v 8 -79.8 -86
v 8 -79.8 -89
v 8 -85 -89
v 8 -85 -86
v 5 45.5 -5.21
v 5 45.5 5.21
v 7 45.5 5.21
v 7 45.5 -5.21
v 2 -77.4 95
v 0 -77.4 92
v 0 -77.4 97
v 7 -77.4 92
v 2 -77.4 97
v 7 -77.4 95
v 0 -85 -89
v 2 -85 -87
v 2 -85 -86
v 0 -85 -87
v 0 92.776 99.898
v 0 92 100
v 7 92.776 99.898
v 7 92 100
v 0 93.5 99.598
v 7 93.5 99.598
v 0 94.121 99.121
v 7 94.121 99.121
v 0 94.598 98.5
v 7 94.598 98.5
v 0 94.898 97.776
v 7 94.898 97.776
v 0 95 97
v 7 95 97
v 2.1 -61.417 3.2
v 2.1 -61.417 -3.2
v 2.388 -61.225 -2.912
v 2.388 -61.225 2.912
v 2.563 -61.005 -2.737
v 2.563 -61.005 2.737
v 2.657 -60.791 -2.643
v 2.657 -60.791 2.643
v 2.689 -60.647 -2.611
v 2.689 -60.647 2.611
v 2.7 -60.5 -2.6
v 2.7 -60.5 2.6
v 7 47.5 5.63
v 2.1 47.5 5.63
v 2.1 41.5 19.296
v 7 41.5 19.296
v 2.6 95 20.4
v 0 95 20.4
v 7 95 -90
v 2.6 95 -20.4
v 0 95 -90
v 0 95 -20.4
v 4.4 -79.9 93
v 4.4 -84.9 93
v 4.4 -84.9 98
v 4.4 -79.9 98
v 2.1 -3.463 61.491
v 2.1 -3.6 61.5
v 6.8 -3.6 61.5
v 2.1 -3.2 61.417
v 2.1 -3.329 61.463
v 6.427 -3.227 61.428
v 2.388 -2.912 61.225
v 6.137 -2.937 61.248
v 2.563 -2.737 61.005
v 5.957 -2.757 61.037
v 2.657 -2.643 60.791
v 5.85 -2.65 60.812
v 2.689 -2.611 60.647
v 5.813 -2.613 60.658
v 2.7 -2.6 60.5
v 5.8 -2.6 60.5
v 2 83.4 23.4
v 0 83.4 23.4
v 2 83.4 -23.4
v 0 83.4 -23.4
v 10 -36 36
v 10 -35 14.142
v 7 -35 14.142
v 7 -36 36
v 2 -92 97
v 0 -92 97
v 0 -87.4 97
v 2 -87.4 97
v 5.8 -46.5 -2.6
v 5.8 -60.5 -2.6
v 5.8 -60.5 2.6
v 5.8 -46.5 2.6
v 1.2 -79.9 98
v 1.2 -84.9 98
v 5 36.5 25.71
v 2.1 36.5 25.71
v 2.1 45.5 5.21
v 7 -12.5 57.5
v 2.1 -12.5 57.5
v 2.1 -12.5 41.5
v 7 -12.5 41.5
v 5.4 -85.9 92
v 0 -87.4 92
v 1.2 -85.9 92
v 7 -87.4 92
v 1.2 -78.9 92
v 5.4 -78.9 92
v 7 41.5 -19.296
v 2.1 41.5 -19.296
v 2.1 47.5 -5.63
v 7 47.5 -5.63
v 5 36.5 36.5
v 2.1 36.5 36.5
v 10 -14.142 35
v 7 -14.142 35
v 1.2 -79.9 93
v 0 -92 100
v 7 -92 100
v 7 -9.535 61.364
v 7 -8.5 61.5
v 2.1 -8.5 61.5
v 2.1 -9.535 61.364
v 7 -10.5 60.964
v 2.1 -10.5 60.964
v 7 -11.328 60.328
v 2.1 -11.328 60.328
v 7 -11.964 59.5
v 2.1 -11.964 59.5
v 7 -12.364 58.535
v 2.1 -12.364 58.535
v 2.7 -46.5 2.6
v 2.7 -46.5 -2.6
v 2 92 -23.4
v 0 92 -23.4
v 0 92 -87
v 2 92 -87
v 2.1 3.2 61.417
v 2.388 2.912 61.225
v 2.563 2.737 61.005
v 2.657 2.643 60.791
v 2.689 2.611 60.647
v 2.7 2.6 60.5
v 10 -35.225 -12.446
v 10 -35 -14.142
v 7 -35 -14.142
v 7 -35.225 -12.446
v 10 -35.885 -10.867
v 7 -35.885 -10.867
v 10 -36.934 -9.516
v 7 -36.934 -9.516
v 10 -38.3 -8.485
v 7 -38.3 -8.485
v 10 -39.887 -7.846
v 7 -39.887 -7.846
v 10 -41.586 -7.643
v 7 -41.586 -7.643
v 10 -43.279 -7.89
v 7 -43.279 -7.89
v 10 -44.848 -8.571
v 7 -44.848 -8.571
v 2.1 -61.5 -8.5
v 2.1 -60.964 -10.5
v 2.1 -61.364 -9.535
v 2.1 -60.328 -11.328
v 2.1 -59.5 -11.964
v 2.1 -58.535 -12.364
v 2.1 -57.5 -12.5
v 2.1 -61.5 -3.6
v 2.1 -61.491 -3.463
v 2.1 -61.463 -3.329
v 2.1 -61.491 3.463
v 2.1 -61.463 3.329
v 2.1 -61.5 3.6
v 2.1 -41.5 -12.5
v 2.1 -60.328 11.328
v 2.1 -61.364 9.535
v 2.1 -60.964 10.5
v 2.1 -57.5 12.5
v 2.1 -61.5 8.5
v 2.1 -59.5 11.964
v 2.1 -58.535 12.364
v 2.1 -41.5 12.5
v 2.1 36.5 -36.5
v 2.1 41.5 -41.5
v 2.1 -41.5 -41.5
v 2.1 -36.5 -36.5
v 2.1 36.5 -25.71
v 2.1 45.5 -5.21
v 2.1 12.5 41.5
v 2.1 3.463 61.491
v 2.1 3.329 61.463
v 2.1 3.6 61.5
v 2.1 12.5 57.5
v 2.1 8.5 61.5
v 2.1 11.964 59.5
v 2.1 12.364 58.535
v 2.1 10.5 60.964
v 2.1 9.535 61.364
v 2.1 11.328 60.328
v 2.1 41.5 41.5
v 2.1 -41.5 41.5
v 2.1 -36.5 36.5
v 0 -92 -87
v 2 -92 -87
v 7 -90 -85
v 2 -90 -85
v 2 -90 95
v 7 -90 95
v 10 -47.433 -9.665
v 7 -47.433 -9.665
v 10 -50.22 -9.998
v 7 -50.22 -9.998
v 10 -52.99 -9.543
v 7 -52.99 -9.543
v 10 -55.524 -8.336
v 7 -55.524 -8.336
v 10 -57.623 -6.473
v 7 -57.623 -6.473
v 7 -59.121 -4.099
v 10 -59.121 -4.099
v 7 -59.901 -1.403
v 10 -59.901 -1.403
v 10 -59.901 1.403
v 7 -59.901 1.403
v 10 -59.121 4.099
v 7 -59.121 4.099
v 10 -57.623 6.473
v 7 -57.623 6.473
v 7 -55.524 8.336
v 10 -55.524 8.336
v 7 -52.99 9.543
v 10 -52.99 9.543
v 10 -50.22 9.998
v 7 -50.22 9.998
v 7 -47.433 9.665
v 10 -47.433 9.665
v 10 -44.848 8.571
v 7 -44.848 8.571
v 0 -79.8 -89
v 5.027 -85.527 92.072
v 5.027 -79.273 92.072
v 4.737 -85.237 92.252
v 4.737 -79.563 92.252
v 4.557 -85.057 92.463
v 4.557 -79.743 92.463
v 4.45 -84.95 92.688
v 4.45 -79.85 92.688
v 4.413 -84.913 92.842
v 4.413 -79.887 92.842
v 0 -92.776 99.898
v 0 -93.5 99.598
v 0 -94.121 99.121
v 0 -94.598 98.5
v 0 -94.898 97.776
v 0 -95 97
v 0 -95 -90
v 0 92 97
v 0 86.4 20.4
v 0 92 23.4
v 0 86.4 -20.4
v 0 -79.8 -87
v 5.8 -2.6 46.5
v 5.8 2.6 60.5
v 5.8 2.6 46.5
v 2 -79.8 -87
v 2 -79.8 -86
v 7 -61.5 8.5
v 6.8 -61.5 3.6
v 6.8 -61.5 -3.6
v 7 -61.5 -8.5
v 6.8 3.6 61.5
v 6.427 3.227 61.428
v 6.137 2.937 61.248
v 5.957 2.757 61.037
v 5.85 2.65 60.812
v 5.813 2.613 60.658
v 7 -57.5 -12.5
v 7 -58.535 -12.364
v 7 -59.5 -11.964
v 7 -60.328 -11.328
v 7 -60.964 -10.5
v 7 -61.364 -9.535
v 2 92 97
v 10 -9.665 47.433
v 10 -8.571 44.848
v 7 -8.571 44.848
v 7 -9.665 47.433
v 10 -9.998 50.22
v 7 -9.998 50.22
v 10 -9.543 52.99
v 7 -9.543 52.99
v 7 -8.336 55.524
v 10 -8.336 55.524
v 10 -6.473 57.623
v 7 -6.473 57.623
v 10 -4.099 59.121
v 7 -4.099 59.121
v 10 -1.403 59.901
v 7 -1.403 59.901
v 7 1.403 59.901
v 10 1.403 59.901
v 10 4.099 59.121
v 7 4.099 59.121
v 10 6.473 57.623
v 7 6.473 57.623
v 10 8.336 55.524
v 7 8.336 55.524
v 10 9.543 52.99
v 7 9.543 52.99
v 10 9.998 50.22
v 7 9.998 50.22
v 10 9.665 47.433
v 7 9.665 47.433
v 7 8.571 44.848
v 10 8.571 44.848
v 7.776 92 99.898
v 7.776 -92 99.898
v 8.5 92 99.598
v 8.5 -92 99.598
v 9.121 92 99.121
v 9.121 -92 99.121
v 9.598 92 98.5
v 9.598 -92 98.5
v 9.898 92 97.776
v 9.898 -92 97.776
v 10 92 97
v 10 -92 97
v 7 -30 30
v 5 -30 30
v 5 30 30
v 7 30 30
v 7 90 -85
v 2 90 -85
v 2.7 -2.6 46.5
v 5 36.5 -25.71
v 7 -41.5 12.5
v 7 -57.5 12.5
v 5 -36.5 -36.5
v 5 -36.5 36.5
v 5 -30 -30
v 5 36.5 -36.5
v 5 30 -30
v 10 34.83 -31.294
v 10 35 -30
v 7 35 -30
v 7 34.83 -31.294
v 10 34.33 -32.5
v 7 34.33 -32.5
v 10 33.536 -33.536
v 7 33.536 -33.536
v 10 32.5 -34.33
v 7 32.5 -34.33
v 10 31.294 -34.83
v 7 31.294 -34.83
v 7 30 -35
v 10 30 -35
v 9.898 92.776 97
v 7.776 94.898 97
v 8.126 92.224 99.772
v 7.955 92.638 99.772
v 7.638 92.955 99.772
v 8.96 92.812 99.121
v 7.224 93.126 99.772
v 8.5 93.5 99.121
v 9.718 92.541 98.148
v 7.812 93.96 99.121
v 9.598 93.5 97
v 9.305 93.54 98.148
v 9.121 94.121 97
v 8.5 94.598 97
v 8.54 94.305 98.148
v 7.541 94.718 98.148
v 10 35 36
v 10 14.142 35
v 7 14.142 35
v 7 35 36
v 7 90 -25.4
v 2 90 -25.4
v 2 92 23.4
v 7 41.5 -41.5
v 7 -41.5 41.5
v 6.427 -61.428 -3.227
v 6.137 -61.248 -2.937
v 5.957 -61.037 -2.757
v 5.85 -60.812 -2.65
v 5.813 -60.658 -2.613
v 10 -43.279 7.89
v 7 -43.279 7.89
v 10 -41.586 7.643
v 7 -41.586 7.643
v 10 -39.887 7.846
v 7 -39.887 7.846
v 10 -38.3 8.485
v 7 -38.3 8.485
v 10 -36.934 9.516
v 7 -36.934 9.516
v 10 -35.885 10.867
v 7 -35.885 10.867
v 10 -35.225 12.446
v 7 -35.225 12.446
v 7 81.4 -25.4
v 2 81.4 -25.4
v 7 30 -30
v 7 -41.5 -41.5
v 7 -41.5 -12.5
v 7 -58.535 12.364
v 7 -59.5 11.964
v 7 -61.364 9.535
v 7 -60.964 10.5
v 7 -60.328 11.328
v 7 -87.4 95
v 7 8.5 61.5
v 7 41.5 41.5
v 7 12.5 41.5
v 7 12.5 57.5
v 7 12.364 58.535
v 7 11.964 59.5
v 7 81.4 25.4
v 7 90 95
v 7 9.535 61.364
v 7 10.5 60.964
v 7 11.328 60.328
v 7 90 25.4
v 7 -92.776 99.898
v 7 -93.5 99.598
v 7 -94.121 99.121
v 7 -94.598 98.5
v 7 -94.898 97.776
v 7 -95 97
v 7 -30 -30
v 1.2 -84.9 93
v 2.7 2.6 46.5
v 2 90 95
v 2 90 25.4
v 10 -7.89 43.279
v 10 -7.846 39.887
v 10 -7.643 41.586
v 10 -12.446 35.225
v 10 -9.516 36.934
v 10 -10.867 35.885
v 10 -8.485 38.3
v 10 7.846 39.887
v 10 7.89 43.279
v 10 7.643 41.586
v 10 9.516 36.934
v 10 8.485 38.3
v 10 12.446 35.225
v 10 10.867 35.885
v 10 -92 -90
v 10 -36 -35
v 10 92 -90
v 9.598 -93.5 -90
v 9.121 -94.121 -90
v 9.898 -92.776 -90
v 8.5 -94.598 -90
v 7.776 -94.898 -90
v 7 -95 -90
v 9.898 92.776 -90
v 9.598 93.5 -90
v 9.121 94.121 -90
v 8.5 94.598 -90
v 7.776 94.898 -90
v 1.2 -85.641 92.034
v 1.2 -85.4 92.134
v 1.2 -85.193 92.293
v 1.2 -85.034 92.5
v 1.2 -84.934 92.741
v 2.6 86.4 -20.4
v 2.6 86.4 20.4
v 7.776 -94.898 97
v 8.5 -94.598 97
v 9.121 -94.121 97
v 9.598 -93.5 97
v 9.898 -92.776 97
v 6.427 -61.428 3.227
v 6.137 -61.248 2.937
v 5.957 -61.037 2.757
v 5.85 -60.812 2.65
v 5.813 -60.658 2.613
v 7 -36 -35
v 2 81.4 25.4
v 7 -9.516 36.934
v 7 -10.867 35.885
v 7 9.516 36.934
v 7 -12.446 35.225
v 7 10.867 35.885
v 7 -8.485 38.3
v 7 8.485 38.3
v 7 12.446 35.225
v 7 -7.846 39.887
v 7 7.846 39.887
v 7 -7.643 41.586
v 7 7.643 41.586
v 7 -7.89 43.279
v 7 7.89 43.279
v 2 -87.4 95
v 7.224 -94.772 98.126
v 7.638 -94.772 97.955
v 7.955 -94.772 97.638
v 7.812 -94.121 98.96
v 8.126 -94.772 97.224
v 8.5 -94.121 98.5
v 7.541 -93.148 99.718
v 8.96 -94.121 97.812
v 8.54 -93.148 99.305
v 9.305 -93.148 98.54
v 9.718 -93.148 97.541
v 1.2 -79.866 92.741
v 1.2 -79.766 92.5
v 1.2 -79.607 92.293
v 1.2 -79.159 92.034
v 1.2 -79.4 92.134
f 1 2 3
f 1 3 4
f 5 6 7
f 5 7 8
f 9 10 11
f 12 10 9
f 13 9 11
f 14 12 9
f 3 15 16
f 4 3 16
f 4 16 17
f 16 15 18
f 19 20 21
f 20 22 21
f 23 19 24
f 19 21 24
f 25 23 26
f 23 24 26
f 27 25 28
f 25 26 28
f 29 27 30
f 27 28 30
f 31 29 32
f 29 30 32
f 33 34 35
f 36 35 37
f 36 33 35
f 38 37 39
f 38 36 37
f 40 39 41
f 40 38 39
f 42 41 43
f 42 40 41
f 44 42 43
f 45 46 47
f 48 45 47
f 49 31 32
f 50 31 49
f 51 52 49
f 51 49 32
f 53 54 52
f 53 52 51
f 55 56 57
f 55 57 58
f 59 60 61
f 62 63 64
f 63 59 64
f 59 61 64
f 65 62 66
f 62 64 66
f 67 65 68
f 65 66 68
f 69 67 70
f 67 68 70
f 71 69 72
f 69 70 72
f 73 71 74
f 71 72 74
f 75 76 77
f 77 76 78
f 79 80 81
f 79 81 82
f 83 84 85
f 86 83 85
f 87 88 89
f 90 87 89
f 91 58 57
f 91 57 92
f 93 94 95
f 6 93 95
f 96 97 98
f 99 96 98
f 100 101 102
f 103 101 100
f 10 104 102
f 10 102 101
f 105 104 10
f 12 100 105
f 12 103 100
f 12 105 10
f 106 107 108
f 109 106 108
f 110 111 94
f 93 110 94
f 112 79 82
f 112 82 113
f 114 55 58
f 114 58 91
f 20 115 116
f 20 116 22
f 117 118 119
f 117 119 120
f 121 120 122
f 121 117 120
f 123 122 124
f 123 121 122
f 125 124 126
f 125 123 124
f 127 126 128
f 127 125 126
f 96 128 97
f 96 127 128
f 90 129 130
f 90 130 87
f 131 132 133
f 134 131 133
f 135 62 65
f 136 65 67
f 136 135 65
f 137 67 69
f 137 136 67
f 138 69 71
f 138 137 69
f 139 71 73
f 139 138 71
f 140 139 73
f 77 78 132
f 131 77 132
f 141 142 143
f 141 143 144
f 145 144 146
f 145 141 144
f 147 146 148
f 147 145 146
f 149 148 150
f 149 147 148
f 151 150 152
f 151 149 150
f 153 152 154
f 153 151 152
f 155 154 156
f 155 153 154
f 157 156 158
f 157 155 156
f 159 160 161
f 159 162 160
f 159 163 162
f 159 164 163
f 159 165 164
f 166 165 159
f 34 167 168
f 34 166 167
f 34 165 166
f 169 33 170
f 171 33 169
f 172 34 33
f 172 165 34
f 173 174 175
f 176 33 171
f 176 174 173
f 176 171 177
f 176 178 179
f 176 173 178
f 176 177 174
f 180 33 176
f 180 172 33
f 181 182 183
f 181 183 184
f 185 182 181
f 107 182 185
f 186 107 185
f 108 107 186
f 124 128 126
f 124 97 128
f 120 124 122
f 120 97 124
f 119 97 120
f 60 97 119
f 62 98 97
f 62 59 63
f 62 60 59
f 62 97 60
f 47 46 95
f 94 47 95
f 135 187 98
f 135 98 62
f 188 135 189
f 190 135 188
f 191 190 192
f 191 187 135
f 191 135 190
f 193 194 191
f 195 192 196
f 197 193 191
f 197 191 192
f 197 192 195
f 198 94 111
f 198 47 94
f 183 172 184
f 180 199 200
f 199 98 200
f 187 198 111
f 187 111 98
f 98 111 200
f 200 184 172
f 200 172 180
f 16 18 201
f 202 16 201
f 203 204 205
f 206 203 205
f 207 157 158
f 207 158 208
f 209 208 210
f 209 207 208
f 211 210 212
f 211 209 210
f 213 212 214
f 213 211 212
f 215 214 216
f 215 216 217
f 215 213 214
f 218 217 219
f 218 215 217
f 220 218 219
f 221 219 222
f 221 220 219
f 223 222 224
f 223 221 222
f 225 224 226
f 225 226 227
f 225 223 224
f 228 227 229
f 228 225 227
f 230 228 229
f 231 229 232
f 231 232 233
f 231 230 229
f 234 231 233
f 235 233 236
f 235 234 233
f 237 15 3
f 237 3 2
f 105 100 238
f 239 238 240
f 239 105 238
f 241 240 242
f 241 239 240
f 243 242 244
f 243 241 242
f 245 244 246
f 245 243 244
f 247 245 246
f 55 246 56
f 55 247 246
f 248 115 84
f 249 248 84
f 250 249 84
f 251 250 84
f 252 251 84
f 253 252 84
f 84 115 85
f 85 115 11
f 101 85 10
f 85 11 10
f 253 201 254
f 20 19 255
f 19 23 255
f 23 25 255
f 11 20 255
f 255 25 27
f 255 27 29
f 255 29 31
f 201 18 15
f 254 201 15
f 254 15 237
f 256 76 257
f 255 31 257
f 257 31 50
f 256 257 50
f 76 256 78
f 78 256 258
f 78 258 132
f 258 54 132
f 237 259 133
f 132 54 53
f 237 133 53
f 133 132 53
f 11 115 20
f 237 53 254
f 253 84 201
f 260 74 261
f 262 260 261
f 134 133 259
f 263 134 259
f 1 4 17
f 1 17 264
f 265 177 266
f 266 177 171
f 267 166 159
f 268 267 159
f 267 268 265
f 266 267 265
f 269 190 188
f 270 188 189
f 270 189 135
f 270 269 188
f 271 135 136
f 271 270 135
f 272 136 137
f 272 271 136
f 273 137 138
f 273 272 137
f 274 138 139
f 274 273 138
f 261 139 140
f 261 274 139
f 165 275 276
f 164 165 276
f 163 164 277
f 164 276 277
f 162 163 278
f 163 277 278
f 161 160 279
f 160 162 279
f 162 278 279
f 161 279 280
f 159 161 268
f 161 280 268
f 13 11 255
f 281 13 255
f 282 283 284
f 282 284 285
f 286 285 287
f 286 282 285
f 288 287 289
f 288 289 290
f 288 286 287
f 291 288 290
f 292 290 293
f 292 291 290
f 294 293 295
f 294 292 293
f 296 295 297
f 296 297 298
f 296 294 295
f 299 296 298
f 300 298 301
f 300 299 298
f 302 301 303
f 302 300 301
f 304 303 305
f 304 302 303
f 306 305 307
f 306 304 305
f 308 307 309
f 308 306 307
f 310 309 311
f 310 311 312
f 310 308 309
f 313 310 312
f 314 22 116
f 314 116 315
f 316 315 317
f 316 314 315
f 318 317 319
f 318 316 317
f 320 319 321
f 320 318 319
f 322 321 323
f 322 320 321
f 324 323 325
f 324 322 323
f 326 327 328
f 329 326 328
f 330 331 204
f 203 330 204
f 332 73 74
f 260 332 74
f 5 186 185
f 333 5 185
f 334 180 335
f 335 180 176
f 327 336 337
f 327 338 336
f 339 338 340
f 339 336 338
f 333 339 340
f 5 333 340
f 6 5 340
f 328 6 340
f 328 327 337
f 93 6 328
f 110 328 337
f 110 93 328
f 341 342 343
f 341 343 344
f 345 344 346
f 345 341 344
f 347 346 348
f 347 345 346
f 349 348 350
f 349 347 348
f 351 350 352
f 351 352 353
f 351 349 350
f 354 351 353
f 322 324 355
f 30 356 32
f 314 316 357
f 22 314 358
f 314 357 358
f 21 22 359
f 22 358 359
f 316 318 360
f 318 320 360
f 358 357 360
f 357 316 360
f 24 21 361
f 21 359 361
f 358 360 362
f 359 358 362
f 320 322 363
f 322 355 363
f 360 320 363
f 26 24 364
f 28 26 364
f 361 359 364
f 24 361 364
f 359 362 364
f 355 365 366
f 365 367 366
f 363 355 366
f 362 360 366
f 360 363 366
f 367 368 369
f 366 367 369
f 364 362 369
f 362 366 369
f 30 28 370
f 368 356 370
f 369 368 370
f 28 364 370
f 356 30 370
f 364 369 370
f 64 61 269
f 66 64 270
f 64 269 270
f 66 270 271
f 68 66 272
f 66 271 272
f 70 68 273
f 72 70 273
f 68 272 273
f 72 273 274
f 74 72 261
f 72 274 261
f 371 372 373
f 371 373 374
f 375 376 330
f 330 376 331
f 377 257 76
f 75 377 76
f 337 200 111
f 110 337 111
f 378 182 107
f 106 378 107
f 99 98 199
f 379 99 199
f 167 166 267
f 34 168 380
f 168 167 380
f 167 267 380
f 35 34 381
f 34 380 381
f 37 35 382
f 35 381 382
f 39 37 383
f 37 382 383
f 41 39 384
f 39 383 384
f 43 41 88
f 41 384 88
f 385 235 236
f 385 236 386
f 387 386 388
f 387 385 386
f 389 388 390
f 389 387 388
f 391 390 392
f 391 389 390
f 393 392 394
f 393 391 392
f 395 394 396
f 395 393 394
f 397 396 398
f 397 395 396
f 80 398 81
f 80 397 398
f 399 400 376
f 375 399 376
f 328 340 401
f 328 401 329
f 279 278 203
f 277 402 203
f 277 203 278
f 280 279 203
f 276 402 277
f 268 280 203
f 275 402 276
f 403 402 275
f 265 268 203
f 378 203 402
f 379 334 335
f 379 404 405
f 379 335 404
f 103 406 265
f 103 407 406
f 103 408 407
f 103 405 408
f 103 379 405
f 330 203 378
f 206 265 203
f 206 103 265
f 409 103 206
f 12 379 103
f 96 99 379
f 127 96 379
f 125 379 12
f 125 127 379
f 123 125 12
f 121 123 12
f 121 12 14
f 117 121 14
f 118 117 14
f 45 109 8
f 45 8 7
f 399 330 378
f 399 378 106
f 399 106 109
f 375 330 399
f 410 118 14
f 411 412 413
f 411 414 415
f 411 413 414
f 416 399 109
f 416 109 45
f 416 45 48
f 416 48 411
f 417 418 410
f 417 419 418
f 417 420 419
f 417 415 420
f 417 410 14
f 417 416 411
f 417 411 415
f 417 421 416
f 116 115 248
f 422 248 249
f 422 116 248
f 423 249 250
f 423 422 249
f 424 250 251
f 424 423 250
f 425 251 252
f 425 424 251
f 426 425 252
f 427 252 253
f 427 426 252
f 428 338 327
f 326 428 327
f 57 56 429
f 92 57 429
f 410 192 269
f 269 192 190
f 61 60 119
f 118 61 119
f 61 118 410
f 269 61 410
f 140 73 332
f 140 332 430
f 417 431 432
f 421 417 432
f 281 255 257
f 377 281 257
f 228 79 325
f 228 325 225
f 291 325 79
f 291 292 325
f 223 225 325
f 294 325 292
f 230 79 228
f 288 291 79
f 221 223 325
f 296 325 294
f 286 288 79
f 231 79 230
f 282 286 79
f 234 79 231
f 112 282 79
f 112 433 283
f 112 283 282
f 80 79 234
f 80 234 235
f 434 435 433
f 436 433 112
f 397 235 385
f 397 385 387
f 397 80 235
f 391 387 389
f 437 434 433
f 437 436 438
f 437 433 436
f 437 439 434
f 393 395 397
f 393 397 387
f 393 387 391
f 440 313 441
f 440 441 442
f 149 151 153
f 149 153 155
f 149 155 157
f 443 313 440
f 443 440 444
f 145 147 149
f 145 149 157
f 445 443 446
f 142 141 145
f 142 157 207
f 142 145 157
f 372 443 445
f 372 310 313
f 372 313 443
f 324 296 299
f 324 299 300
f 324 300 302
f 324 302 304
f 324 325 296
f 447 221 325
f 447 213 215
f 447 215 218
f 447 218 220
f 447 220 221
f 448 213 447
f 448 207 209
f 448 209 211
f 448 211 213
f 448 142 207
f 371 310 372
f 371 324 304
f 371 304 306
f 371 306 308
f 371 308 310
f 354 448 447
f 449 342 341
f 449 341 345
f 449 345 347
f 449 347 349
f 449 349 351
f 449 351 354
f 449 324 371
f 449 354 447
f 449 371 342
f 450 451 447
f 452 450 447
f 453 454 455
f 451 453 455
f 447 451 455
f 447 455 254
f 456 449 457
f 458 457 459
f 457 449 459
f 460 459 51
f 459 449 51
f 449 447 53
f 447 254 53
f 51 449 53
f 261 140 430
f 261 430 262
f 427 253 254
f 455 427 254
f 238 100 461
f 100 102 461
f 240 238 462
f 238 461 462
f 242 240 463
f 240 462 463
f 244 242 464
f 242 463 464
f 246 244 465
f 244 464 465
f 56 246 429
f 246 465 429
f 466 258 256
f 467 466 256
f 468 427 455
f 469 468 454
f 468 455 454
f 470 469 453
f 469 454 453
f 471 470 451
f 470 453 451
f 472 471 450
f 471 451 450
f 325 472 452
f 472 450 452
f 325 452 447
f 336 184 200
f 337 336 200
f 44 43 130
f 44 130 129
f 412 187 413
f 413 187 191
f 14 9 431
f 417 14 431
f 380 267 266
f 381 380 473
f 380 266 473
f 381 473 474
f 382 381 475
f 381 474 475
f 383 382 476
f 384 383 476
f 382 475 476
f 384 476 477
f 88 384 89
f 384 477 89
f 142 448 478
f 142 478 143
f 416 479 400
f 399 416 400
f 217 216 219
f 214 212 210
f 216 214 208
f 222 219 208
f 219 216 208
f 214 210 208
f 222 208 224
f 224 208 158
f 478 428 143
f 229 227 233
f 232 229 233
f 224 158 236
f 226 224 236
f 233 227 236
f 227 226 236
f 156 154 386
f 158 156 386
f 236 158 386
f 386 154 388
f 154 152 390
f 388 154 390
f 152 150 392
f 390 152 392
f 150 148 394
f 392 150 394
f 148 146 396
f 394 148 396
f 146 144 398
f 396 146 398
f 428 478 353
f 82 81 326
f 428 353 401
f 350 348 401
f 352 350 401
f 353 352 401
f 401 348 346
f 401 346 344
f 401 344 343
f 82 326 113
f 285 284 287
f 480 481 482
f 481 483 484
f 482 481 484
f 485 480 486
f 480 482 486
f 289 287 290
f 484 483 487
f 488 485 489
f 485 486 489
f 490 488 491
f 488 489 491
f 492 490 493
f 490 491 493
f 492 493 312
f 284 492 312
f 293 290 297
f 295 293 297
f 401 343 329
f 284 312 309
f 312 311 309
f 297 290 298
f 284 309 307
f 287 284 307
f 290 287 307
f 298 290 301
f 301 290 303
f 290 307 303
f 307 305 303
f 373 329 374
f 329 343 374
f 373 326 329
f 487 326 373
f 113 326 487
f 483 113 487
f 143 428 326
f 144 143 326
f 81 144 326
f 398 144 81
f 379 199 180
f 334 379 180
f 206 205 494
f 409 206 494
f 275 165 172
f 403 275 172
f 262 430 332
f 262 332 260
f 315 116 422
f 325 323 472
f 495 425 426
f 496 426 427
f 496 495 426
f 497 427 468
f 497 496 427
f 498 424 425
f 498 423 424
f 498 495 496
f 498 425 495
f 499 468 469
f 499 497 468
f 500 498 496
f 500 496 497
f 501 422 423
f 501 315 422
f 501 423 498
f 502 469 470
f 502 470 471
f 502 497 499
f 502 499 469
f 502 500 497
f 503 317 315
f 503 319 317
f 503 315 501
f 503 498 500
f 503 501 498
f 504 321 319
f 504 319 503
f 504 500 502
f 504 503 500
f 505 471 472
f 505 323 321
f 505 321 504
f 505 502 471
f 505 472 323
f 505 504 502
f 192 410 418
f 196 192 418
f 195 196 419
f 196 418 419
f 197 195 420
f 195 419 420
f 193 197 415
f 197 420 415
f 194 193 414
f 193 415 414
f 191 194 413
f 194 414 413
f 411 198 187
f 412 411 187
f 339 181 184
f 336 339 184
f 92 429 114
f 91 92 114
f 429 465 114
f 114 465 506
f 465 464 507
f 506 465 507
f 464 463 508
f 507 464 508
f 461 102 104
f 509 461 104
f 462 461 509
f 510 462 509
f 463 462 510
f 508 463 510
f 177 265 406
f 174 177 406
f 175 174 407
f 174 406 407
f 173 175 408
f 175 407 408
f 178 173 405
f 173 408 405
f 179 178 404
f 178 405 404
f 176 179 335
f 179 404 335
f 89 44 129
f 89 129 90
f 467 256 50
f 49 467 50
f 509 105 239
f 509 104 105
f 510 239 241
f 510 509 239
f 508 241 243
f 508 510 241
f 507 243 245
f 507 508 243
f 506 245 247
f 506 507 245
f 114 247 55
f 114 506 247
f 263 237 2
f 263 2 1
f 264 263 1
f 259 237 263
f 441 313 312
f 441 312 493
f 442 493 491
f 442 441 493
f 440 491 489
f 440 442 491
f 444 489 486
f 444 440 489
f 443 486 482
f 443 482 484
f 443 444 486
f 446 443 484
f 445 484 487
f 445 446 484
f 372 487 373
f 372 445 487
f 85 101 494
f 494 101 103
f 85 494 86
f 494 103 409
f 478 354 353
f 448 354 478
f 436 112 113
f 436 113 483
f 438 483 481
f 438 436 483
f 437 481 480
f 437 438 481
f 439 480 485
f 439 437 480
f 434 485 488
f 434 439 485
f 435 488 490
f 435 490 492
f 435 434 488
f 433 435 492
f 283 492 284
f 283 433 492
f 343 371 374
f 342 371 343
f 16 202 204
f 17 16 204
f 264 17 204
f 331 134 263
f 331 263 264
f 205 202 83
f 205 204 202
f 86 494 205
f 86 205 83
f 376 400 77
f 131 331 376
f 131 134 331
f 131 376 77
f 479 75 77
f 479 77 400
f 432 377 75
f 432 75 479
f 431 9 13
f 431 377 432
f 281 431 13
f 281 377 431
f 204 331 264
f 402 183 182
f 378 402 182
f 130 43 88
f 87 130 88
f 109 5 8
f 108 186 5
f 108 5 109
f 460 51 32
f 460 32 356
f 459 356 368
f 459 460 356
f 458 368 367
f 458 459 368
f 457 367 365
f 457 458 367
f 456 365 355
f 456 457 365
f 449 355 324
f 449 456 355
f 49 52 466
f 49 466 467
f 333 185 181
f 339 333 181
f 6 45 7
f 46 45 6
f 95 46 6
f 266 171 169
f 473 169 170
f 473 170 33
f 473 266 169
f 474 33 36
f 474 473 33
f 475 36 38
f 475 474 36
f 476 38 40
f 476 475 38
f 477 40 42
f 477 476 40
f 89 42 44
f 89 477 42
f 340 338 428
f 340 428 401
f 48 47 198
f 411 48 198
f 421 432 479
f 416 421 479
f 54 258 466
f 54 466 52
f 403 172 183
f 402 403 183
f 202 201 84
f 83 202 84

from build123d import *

# Parameters (mm, degrees)
SKETCH1_W           = 190
SKETCH1_H           = 190
BOSS_EXTRUDE1_DEPTH = 10
CUT_EXTRUDE1_DEPTH  = 5
SKETCH3_W           = 60
SKETCH3_H           = 60
CUT_EXTRUDE2_DEPTH  = 139.021737418
CUT_EXTRUDE3_DEPTH  = 3
SKETCH8_W           = 40.8
SKETCH8_H           = 12.294985481
CUT_EXTRUDE4_DEPTH  = 2.6
CUT_EXTRUDE5_DEPTH  = 7
FILLET1_R           = 3
SKETCH10_W          = 3.1
SKETCH10_H          = 5.2
CUT_EXTRUDE6_DEPTH  = 15
FILLET2_R           = 1
SKETCH11_W          = 3.1
SKETCH11_H          = 5.2
CUT_EXTRUDE7_DEPTH  = 15
FILLET3_R           = 1
FILLET4_R           = 4
SKETCH12_W          = 4
SKETCH12_H          = 5.2
CUT_EXTRUDE8_DEPTH  = 2
SKETCH13_W          = 3
SKETCH13_H          = 5.2
CUT_EXTRUDE9_DEPTH  = 6
SKETCH14_W          = 3
SKETCH14_H          = 10
BOSS_EXTRUDE2_DEPTH = 7
SKETCH16_W          = 3.2
SKETCH16_H          = 5
CUT_EXTRUDE10_DEPTH = 6
FILLET5_R           = 1
SKETCH17_W          = 131.159114754
SKETCH17_H          = 131.95401848
CUT_EXTRUDE11_DEPTH = 2.1
CUT_EXTRUDE12_DEPTH = 2


with BuildPart() as part:
    # Sketch1 → Boss-Extrude1 (new body)
    with BuildSketch(Plane(origin=(0, 0, 0), x_dir=(0, 0, -1), z_dir=(1, 0, 0))):
        with Locations((-5, 0)):
            Rectangle(SKETCH1_W, SKETCH1_H)
    extrude(amount=BOSS_EXTRUDE1_DEPTH)

    # Sketch2 → Cut-Extrude1 (cut)
    with BuildSketch(Plane.ZY):
        Polygon((36.5, -36.5), (36.5, 36.5), (25.709845909, 36.5), (5.209845909, 45.5), (-5.209845909, 45.5), (-25.709845909, 36.5), (-36.5, 36.5), (-36.5, -36.5), align=None)
    extrude(amount=-CUT_EXTRUDE1_DEPTH, mode=Mode.SUBTRACT)

    # Sketch3 → Cut-Extrude2 (cut, through all)
    with BuildSketch(Plane.ZY.offset(-5)):
        Rectangle(SKETCH3_W, SKETCH3_H)
    extrude(amount=-CUT_EXTRUDE2_DEPTH, mode=Mode.SUBTRACT)

    # Sketch4 → Cut-Extrude3 (cut)
    with BuildSketch(Plane(origin=(10, 0, 0), x_dir=(0, 0, -1), z_dir=(1, 0, 0))):
        with BuildLine():
            Line((35, 29.999999003), (35, -35.000000997))
            Line((35, -35.000000997), (35, -36.000000997))
            Line((35, -36.000000997), (14.142135624, -35.000000997))
            ThreePointArc((14.142135624, -35.000000997), (8.484611805, -38.299622231), (8.570991287, -44.848485845))
            ThreePointArc((8.570991287, -44.848485845), (0, -60.000000997), (-8.570991287, -44.848485845))
            ThreePointArc((-8.570991287, -44.848485845), (-8.484611805, -38.299622231), (-14.142135624, -35.000000997))
            Line((-14.142135624, -35.000000997), (-36, -36.000000997))
            Line((-36, -36.000000997), (-35.000001658, -14.142137383))
            ThreePointArc((-35.000001658, -14.142137383), (-38.29962223, -8.484613177), (-44.848485854, -8.570991891))
            ThreePointArc((-44.848485854, -8.570991891), (-60, 1.173e-06), (-44.848483843, 8.570990683))
            ThreePointArc((-44.848483843, 8.570990683), (-38.29962024, 8.484610433), (-34.999998342, 14.142133865))
            Line((-34.999998342, 14.142133865), (-36, 34.999999003))
            Line((-36, 34.999999003), (-35, 34.999999003))
            Line((-35, 34.999999003), (30, 34.999999003))
            ThreePointArc((30, 34.999999003), (33.535533906, 33.535532909), (35, 29.999999003))
        make_face()
    extrude(amount=-CUT_EXTRUDE3_DEPTH, mode=Mode.SUBTRACT)

    # Sketch8 → Cut-Extrude4 (cut)
    with BuildSketch(Plane.ZY):
        with Locations((0, 92.547492741)):
            Rectangle(SKETCH8_W, SKETCH8_H)
    extrude(amount=-CUT_EXTRUDE4_DEPTH, mode=Mode.SUBTRACT)

    # Sketch9 → Cut-Extrude5 (cut)
    # profile 1 of 2: a face of its own
    with BuildSketch(Plane.ZY):
        Polygon((-25.4, 90), (-85, 90), (-85, -90), (95, -90), (95, 90), (25.4, 90), (25.4, 81.4), (-25.4, 81.4), align=None)
        Polygon((-41.5, -41.5), (-41.5, 41.5), (-19.296204392, 41.5), (-5.629537726, 47.5), (5.629537726, 47.5), (19.296204392, 41.5), (41.5, 41.5), (41.5, 12.5), (61.5, 12.5), (61.5, -12.5), (41.5, -12.5), (41.5, -41.5), (12.5, -41.5), (12.5, -61.5), (-12.5, -61.5), (-12.5, -41.5), align=None, mode=Mode.SUBTRACT)
    # profile 2 of 2: a face of its own
    with BuildSketch(Plane.ZY):
        Polygon((-5.629537726, 47.5), (5.629537726, 47.5), (5.209845909, 45.5), (-5.209845909, 45.5), align=None)
    extrude(amount=-CUT_EXTRUDE5_DEPTH, mode=Mode.SUBTRACT)

    # Fillet1
    fillet1_edges = [part.edges().sort_by_distance(p)[0] for p in [
        (10, 95, 5),
        (10, 0, 100),
        (5, 95, 100),
        (5, -95, 100),
        (10, -95, 5),
    ]]
    fillet(fillet1_edges, radius=FILLET1_R)

    # Sketch10 → Cut-Extrude6 (cut)
    with BuildSketch(Plane.XZ.offset(61.5)):
        with Locations((4.25, 0)):
            Rectangle(SKETCH10_W, SKETCH10_H)
    extrude(amount=-CUT_EXTRUDE6_DEPTH, mode=Mode.SUBTRACT)

    # Fillet2
    fillet2_edges = [part.edges().sort_by_distance(p)[0] for p in [
        (2.7, -61.5, 0),
        (4.25, -61.5, -2.6),
        (5.8, -61.5, 0),
        (4.25, -61.5, 2.6),
    ]]
    fillet(fillet2_edges, radius=FILLET2_R)

    # Sketch11 → Cut-Extrude7 (cut)
    with BuildSketch(Plane.XY.offset(61.5)):
        with Locations((4.25, 0)):
            Rectangle(SKETCH11_W, SKETCH11_H)
    extrude(amount=-CUT_EXTRUDE7_DEPTH, mode=Mode.SUBTRACT)

    # Fillet3
    fillet3_edges = [part.edges().sort_by_distance(p)[0] for p in [
        (2.7, 0, 61.5),
        (4.25, -2.6, 61.5),
        (5.8, 0, 61.5),
        (4.25, 2.6, 61.5),
    ]]
    fillet(fillet3_edges, radius=FILLET3_R)

    # Fillet4
    fillet4_edges = [part.edges().sort_by_distance(p)[0] for p in [
        (3.5, -61.5, -12.5),
        (3.5, -61.5, 12.5),
        (3.5, -12.5, 61.5),
        (3.5, 12.5, 61.5),
    ]]
    fillet(fillet4_edges, radius=FILLET4_R)

    # Sketch12 → Cut-Extrude8 (cut)
    with BuildSketch(Plane.ZY):
        with Locations((-87, -82.4)):
            Rectangle(SKETCH12_W, SKETCH12_H)
    extrude(amount=-CUT_EXTRUDE8_DEPTH, mode=Mode.SUBTRACT)

    # Sketch13 → Cut-Extrude9 (cut)
    with BuildSketch(Plane.ZY.offset(-2)):
        with Locations((-87.5, -82.4)):
            Rectangle(SKETCH13_W, SKETCH13_H)
    extrude(amount=-CUT_EXTRUDE9_DEPTH, mode=Mode.SUBTRACT)

    # Sketch14 → Boss-Extrude2 (add)
    with BuildSketch(Plane.ZY.offset(-7)):
        with Locations((93.5, -82.4)):
            Rectangle(SKETCH14_W, SKETCH14_H)
    extrude(amount=BOSS_EXTRUDE2_DEPTH)

    # Sketch16 → Cut-Extrude10 (cut)
    with BuildSketch(Plane(origin=(0, 0, 92), x_dir=(-1, 0, 0), z_dir=(0, 0, -1))):
        with Locations((-2.8, -82.4)):
            Rectangle(SKETCH16_W, SKETCH16_H)
    extrude(amount=-CUT_EXTRUDE10_DEPTH, mode=Mode.SUBTRACT)

    # Fillet5
    fillet5_edges = [part.edges().sort_by_distance(p)[0] for p in [
        (4.4, -82.4, 92),
        (2.8, -84.9, 92),
        (2.8, -79.9, 92),
    ]]
    fillet(fillet5_edges, radius=FILLET5_R)

    # Sketch17 → Cut-Extrude11 (cut)
    with BuildSketch(Plane.ZY):
        Rectangle(SKETCH17_W, SKETCH17_H)
    extrude(amount=-CUT_EXTRUDE11_DEPTH, mode=Mode.SUBTRACT)

    # Sketch18 → Cut-Extrude12 (cut)
    with BuildSketch(Plane.ZY):
        Polygon((-23.4, 92), (-87, 92), (-87, -79.8), (-85, -79.8), (-85, 90), (-25.4, 90), (-25.4, 81.4), (25.4, 81.4), (25.4, 90), (95, 90), (95, -77.4), (97, -77.4), (97, 92), (23.4, 92), (23.4, 83.4), (-23.4, 83.4), align=None)
        Polygon((-85, -79.8), (-87, -79.8), (-87, -85), (-85, -85), (-85, -90), (95, -90), (95, -87.4), (92, -87.4), (92, -77.4), (95, -77.4), (95, 90), (25.4, 90), (25.4, 81.4), (-25.4, 81.4), (-25.4, 90), (-85, 90), align=None)
        Polygon((-85, -85), (-87, -85), (-87, -92), (97, -92), (97, -87.4), (95, -87.4), (95, -90), (-85, -90), align=None)
    extrude(amount=-CUT_EXTRUDE12_DEPTH, mode=Mode.SUBTRACT)


solid = part.part
